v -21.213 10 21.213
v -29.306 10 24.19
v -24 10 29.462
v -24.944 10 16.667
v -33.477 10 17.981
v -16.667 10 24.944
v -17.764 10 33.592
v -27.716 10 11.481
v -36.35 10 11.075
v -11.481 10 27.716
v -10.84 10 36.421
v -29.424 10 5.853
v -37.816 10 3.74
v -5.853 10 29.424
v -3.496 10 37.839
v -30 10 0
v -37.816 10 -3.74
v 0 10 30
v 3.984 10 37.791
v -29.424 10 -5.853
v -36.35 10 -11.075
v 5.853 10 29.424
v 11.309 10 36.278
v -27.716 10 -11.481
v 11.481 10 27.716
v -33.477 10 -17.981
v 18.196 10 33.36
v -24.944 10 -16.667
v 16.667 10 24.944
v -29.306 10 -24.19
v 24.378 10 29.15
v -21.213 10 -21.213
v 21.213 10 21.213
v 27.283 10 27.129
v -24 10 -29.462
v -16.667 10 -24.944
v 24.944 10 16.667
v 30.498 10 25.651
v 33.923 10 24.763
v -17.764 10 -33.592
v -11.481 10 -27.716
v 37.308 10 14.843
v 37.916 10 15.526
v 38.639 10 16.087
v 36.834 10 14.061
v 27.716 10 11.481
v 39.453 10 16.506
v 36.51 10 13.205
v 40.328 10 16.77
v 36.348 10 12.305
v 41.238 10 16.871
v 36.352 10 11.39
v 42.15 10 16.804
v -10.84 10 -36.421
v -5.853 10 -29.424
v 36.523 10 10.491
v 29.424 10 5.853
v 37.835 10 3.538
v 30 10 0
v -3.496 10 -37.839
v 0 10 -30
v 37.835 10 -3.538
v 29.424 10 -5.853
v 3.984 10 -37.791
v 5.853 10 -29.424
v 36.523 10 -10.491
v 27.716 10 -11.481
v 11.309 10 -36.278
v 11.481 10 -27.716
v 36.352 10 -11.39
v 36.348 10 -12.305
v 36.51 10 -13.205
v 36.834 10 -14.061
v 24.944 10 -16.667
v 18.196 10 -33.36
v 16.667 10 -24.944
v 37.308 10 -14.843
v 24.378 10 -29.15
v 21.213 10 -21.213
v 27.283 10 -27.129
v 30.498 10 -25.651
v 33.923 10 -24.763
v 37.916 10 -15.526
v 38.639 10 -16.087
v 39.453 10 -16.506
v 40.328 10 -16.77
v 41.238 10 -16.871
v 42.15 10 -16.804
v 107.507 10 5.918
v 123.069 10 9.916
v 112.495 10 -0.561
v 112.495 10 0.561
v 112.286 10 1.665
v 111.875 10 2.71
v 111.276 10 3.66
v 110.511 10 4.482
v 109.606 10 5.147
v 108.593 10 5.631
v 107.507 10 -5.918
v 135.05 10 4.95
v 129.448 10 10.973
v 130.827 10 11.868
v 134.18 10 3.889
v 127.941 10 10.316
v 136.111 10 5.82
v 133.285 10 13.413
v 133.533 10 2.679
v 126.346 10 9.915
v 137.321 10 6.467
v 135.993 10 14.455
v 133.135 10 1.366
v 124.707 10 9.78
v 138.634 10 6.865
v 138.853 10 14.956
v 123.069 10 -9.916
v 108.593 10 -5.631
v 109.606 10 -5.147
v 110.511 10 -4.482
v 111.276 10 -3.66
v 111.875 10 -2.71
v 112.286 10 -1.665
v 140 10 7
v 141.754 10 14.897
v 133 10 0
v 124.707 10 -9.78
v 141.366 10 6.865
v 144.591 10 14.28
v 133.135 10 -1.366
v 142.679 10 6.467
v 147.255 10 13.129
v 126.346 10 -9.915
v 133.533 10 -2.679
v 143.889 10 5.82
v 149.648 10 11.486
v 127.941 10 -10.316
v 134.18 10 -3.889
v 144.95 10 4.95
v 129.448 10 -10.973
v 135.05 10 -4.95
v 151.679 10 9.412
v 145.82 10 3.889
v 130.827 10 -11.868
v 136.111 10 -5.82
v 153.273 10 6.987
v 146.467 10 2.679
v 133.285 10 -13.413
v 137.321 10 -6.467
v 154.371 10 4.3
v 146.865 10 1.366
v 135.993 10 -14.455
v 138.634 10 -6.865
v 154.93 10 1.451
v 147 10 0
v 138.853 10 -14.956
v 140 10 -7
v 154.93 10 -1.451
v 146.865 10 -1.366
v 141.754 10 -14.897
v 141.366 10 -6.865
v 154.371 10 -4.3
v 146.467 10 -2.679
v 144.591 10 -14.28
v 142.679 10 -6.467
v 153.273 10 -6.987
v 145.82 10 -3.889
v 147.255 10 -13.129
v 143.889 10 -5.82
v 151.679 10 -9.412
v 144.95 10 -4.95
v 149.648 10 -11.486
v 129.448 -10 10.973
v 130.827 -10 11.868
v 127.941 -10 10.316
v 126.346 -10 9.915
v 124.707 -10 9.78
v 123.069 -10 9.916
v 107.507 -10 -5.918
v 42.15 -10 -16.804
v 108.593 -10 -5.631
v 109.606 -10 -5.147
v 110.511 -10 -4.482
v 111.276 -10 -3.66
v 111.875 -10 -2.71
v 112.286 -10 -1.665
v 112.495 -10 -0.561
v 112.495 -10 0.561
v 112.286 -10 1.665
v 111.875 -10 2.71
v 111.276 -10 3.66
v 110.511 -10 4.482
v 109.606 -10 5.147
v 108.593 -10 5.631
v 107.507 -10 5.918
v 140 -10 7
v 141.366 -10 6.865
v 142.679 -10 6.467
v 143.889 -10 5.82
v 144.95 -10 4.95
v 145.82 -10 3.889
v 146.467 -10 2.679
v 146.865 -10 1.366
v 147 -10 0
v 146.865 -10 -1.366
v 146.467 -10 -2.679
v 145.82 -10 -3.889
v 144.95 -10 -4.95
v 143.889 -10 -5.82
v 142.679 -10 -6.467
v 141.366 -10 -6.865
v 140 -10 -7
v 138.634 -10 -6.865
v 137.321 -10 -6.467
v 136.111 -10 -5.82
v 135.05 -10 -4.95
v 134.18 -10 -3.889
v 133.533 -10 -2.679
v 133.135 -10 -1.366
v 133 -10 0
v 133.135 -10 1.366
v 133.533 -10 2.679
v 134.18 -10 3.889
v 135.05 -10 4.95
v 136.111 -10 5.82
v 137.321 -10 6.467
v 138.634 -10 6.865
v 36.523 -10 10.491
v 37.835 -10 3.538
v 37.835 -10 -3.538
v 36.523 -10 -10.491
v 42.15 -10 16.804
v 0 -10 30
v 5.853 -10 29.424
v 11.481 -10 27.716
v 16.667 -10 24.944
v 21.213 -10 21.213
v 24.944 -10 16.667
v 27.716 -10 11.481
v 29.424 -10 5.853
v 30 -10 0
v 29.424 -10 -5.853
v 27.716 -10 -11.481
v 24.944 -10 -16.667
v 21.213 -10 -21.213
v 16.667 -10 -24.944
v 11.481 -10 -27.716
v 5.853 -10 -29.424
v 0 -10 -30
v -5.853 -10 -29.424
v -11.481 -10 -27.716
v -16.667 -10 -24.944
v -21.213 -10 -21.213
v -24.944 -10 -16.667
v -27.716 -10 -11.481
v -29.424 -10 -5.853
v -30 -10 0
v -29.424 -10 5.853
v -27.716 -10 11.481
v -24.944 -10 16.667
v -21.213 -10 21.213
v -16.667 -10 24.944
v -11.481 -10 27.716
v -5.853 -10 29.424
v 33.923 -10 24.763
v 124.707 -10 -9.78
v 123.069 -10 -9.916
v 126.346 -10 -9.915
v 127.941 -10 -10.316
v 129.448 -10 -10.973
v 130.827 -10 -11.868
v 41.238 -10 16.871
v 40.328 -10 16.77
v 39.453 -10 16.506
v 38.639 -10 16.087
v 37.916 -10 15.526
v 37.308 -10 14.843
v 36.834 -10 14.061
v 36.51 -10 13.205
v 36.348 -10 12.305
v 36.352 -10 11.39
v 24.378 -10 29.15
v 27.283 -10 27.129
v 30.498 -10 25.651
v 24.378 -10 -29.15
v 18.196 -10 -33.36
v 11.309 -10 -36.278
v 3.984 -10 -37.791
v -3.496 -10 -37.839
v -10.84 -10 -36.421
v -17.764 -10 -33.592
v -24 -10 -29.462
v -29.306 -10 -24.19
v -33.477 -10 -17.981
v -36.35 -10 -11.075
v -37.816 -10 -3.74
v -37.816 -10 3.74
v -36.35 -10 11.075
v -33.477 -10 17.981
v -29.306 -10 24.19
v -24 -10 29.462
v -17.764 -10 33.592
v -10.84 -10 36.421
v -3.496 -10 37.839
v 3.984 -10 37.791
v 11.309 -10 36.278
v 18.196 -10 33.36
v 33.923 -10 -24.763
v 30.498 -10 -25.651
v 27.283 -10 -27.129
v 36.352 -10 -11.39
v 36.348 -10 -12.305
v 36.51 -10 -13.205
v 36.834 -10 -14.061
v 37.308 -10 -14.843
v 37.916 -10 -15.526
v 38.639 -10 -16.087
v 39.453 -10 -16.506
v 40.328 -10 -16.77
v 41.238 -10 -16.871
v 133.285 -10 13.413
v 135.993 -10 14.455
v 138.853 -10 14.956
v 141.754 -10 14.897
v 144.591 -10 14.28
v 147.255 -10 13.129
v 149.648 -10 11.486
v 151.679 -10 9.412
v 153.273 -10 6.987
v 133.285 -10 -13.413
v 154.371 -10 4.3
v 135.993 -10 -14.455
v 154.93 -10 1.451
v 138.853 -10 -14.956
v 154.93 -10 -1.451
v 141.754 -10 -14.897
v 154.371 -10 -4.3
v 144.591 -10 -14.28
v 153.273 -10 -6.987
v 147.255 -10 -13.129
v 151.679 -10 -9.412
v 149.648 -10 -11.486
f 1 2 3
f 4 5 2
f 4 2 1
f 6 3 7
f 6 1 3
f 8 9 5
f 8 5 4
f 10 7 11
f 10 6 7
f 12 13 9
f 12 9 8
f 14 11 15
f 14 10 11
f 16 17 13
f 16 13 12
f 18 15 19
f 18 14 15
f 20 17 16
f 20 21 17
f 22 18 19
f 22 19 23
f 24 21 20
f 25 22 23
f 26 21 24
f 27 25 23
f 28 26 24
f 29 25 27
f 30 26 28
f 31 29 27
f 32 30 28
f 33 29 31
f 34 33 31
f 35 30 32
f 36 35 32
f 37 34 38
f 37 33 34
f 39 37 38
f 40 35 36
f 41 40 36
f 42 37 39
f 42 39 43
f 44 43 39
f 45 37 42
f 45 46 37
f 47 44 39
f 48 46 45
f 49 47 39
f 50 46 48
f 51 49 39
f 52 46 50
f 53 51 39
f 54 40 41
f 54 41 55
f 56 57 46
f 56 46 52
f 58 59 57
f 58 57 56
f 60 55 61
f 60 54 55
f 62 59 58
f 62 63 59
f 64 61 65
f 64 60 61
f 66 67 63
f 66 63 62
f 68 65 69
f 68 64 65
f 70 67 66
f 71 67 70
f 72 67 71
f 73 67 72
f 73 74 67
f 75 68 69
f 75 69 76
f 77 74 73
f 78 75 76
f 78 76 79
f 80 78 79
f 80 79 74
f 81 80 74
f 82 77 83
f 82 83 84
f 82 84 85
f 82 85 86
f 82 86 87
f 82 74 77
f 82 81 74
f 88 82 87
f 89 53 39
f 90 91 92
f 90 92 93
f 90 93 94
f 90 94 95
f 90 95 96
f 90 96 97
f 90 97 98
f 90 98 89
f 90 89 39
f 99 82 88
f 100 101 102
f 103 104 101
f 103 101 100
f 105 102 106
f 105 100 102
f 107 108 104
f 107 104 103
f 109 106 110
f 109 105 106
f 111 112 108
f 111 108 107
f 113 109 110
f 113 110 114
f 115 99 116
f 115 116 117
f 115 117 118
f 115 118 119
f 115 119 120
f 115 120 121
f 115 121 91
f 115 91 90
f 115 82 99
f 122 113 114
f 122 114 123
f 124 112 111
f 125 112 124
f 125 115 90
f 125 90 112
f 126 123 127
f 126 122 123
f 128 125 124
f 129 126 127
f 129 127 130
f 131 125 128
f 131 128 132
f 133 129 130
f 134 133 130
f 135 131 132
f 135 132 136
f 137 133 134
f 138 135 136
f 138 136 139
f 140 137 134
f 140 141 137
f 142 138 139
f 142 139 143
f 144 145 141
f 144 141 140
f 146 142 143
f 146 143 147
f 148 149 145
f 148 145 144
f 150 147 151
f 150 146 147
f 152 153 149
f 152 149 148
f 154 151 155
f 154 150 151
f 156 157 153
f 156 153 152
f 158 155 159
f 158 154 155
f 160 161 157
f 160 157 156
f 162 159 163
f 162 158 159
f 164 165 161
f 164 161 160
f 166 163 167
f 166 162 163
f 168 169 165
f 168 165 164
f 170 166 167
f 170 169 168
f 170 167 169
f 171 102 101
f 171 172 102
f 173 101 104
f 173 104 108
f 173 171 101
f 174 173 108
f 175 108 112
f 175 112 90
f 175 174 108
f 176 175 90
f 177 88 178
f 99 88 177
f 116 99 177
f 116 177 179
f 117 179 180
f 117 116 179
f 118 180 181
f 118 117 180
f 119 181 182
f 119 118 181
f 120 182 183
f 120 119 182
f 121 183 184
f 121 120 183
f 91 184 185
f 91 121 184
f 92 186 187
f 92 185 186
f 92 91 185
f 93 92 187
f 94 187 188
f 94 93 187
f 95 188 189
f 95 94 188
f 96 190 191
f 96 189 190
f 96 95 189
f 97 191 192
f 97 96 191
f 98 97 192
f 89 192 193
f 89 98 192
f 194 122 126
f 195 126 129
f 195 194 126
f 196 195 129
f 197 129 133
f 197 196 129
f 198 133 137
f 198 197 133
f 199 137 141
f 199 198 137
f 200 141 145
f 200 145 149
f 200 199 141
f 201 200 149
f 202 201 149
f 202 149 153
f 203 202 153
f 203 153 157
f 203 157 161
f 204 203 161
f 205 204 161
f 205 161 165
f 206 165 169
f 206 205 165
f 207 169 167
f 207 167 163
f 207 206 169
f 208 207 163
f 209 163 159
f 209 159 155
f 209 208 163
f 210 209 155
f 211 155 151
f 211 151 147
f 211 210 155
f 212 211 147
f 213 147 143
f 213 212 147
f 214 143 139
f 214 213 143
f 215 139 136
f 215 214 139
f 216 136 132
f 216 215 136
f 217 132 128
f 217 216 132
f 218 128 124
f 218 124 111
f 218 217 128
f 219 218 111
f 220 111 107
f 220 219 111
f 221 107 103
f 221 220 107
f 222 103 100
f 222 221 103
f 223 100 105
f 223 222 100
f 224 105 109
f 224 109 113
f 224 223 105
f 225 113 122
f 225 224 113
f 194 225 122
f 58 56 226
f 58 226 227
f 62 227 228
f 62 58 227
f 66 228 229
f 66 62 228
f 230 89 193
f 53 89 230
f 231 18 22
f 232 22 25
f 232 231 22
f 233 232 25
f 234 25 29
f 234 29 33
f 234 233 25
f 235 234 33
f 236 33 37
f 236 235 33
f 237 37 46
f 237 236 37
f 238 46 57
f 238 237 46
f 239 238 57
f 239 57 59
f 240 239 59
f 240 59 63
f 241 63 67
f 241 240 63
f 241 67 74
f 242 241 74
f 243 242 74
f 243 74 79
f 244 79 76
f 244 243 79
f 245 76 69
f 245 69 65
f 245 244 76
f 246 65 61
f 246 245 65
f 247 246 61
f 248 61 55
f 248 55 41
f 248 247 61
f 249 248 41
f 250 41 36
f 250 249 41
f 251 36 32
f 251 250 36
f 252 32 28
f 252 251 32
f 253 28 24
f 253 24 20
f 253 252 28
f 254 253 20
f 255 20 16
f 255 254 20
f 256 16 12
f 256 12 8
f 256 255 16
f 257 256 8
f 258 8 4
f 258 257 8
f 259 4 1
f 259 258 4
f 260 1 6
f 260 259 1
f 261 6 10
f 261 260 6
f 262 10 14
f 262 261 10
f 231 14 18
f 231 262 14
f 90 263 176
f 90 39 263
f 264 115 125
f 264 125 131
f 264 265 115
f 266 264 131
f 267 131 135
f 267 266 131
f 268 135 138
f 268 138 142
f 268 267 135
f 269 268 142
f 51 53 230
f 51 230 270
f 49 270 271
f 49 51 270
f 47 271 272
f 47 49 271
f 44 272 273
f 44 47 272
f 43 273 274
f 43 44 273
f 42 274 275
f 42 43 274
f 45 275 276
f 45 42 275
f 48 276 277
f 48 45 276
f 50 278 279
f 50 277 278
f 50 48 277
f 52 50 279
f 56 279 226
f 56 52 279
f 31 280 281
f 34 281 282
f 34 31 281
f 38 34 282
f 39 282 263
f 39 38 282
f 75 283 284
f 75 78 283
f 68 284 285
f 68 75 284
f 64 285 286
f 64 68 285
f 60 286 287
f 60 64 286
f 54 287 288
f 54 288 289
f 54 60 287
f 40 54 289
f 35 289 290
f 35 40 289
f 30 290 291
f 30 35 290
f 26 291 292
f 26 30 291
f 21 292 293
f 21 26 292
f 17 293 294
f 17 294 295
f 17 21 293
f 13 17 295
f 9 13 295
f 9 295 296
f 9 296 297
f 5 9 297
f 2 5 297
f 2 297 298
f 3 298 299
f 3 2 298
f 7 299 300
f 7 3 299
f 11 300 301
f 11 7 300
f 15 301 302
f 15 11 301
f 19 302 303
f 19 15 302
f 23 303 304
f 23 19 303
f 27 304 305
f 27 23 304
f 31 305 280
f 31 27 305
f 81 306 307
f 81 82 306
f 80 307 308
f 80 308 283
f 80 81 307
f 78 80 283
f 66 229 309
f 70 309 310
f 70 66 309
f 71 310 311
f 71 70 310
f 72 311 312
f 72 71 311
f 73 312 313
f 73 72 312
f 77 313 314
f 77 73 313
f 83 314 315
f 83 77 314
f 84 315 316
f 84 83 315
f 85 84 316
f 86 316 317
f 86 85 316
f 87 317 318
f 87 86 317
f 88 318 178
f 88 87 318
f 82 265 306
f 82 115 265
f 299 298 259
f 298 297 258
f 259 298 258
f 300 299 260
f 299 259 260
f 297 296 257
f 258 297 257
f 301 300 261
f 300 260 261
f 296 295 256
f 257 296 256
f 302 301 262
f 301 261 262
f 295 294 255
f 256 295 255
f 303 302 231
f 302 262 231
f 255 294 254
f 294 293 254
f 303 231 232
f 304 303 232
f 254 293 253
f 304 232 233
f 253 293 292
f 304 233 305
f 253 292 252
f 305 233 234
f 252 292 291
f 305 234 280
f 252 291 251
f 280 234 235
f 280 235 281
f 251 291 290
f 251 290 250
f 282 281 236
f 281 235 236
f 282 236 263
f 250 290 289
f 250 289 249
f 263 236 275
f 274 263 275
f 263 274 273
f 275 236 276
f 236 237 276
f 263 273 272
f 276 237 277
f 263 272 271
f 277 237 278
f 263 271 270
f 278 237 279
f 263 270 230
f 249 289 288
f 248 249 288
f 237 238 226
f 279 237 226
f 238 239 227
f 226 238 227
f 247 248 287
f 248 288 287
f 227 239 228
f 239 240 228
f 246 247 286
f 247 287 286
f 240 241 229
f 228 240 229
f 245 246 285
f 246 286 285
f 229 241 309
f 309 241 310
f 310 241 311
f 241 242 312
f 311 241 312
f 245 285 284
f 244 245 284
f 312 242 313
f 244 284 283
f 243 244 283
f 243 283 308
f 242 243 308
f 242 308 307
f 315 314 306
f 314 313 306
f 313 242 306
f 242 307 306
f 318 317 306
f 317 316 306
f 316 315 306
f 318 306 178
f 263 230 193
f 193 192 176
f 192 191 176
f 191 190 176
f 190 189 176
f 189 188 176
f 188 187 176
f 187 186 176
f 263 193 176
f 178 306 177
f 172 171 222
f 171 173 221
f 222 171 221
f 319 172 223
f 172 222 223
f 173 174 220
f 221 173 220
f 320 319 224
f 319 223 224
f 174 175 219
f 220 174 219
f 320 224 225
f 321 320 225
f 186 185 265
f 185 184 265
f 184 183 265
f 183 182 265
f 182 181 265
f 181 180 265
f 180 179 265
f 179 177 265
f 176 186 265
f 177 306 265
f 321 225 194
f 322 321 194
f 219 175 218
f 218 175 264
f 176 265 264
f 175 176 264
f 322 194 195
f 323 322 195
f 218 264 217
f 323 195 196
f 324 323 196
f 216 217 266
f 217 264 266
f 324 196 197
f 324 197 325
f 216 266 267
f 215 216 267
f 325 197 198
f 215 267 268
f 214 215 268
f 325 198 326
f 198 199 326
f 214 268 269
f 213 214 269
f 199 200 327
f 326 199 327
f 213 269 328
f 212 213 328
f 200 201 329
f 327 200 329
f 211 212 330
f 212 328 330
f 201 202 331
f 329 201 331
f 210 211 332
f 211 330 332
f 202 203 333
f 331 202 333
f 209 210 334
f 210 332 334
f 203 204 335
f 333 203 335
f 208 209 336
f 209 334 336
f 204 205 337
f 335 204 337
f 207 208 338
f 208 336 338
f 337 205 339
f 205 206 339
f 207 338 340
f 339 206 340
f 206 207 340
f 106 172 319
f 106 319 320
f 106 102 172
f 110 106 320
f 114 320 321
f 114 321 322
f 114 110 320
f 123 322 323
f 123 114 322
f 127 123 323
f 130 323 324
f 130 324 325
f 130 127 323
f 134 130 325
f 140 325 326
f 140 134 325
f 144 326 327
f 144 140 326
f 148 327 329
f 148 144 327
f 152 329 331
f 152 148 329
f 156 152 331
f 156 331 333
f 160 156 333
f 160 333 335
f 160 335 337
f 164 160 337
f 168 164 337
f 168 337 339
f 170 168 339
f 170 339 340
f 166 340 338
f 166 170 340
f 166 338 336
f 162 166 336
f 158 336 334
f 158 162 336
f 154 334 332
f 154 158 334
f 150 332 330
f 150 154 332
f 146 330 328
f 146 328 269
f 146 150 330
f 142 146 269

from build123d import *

# Parameters (mm, degrees)
SKETCH1_R           = 30
SKETCH1_R_2         = 7
BOSS_EXTRUDE1_DEPTH = 10
FILLET1_R           = 10
FILLET2_R           = 20
CUT_EXTRUDE1_DEPTH  = 65


with BuildPart() as part:
    # Sketch1 → Boss-Extrude1 (new, symmetric)
    with BuildSketch(Plane(origin=(0, 0, 0), x_dir=(1, 0, 0), z_dir=(0, 1, 0))):
        with BuildLine():
            Line((128.063755469, 9.084385863), (27.935473676, 25.760615491))
            ThreePointArc((27.935473676, 25.760615491), (-38, 0), (27.935473676, -25.760615491))
            Line((27.935473676, -25.760615491), (128.063755469, -9.084385863))
            ThreePointArc((128.063755469, -9.084385863), (155, 0), (128.063755469, 9.084385863))
        make_face()
        with Locations(Location((0, 0, 0), (0, 0, 270))):
            Circle(SKETCH1_R, mode=Mode.SUBTRACT)
        with Locations(Location((140, 0, 0), (0, 0, 270))):
            Circle(SKETCH1_R_2, mode=Mode.SUBTRACT)
    extrude(amount=BOSS_EXTRUDE1_DEPTH, both=True)

    # Fillet1
    fillet1_edges = [part.edges().sort_by_distance(p)[0] for p in [
        (128.063755469, 0, 9.084385863),
        (128.063755469, 0, -9.084385863),
    ]]
    fillet(fillet1_edges, radius=FILLET1_R)

    # Fillet2
    fillet2_edges = [part.edges().sort_by_distance(p)[0] for p in [
        (27.935473676, 0, 25.760615491),
        (27.935473676, 0, -25.760615491),
    ]]
    fillet(fillet2_edges, radius=FILLET2_R)

    # Sketch2 → Cut-Extrude1 (cut)
    with BuildSketch(Plane(origin=(0, 10, 0), x_dir=(1, 0, 0), z_dir=(0, 1, 0))):
        with BuildLine():
            Line((42.150179221, 16.803642214), (107.507453416, 5.918476776))
            ThreePointArc((107.507453416, 5.918476776), (112.52173913, 0), (107.507453416, -5.918476776))
            Line((107.507453416, -5.918476776), (42.150179221, -16.803642214))
            ThreePointArc((42.150179221, -16.803642214), (37.596406424, -15.198680064), (36.523081969, -10.491162161))
            ThreePointArc((36.523081969, -10.491162161), (38, 0), (36.523081969, 10.491162161))
            ThreePointArc((36.523081969, 10.491162161), (37.596406424, 15.198680064), (42.150179221, 16.803642214))
        make_face()
    extrude(amount=-CUT_EXTRUDE1_DEPTH, mode=Mode.SUBTRACT)


solid = part.part
